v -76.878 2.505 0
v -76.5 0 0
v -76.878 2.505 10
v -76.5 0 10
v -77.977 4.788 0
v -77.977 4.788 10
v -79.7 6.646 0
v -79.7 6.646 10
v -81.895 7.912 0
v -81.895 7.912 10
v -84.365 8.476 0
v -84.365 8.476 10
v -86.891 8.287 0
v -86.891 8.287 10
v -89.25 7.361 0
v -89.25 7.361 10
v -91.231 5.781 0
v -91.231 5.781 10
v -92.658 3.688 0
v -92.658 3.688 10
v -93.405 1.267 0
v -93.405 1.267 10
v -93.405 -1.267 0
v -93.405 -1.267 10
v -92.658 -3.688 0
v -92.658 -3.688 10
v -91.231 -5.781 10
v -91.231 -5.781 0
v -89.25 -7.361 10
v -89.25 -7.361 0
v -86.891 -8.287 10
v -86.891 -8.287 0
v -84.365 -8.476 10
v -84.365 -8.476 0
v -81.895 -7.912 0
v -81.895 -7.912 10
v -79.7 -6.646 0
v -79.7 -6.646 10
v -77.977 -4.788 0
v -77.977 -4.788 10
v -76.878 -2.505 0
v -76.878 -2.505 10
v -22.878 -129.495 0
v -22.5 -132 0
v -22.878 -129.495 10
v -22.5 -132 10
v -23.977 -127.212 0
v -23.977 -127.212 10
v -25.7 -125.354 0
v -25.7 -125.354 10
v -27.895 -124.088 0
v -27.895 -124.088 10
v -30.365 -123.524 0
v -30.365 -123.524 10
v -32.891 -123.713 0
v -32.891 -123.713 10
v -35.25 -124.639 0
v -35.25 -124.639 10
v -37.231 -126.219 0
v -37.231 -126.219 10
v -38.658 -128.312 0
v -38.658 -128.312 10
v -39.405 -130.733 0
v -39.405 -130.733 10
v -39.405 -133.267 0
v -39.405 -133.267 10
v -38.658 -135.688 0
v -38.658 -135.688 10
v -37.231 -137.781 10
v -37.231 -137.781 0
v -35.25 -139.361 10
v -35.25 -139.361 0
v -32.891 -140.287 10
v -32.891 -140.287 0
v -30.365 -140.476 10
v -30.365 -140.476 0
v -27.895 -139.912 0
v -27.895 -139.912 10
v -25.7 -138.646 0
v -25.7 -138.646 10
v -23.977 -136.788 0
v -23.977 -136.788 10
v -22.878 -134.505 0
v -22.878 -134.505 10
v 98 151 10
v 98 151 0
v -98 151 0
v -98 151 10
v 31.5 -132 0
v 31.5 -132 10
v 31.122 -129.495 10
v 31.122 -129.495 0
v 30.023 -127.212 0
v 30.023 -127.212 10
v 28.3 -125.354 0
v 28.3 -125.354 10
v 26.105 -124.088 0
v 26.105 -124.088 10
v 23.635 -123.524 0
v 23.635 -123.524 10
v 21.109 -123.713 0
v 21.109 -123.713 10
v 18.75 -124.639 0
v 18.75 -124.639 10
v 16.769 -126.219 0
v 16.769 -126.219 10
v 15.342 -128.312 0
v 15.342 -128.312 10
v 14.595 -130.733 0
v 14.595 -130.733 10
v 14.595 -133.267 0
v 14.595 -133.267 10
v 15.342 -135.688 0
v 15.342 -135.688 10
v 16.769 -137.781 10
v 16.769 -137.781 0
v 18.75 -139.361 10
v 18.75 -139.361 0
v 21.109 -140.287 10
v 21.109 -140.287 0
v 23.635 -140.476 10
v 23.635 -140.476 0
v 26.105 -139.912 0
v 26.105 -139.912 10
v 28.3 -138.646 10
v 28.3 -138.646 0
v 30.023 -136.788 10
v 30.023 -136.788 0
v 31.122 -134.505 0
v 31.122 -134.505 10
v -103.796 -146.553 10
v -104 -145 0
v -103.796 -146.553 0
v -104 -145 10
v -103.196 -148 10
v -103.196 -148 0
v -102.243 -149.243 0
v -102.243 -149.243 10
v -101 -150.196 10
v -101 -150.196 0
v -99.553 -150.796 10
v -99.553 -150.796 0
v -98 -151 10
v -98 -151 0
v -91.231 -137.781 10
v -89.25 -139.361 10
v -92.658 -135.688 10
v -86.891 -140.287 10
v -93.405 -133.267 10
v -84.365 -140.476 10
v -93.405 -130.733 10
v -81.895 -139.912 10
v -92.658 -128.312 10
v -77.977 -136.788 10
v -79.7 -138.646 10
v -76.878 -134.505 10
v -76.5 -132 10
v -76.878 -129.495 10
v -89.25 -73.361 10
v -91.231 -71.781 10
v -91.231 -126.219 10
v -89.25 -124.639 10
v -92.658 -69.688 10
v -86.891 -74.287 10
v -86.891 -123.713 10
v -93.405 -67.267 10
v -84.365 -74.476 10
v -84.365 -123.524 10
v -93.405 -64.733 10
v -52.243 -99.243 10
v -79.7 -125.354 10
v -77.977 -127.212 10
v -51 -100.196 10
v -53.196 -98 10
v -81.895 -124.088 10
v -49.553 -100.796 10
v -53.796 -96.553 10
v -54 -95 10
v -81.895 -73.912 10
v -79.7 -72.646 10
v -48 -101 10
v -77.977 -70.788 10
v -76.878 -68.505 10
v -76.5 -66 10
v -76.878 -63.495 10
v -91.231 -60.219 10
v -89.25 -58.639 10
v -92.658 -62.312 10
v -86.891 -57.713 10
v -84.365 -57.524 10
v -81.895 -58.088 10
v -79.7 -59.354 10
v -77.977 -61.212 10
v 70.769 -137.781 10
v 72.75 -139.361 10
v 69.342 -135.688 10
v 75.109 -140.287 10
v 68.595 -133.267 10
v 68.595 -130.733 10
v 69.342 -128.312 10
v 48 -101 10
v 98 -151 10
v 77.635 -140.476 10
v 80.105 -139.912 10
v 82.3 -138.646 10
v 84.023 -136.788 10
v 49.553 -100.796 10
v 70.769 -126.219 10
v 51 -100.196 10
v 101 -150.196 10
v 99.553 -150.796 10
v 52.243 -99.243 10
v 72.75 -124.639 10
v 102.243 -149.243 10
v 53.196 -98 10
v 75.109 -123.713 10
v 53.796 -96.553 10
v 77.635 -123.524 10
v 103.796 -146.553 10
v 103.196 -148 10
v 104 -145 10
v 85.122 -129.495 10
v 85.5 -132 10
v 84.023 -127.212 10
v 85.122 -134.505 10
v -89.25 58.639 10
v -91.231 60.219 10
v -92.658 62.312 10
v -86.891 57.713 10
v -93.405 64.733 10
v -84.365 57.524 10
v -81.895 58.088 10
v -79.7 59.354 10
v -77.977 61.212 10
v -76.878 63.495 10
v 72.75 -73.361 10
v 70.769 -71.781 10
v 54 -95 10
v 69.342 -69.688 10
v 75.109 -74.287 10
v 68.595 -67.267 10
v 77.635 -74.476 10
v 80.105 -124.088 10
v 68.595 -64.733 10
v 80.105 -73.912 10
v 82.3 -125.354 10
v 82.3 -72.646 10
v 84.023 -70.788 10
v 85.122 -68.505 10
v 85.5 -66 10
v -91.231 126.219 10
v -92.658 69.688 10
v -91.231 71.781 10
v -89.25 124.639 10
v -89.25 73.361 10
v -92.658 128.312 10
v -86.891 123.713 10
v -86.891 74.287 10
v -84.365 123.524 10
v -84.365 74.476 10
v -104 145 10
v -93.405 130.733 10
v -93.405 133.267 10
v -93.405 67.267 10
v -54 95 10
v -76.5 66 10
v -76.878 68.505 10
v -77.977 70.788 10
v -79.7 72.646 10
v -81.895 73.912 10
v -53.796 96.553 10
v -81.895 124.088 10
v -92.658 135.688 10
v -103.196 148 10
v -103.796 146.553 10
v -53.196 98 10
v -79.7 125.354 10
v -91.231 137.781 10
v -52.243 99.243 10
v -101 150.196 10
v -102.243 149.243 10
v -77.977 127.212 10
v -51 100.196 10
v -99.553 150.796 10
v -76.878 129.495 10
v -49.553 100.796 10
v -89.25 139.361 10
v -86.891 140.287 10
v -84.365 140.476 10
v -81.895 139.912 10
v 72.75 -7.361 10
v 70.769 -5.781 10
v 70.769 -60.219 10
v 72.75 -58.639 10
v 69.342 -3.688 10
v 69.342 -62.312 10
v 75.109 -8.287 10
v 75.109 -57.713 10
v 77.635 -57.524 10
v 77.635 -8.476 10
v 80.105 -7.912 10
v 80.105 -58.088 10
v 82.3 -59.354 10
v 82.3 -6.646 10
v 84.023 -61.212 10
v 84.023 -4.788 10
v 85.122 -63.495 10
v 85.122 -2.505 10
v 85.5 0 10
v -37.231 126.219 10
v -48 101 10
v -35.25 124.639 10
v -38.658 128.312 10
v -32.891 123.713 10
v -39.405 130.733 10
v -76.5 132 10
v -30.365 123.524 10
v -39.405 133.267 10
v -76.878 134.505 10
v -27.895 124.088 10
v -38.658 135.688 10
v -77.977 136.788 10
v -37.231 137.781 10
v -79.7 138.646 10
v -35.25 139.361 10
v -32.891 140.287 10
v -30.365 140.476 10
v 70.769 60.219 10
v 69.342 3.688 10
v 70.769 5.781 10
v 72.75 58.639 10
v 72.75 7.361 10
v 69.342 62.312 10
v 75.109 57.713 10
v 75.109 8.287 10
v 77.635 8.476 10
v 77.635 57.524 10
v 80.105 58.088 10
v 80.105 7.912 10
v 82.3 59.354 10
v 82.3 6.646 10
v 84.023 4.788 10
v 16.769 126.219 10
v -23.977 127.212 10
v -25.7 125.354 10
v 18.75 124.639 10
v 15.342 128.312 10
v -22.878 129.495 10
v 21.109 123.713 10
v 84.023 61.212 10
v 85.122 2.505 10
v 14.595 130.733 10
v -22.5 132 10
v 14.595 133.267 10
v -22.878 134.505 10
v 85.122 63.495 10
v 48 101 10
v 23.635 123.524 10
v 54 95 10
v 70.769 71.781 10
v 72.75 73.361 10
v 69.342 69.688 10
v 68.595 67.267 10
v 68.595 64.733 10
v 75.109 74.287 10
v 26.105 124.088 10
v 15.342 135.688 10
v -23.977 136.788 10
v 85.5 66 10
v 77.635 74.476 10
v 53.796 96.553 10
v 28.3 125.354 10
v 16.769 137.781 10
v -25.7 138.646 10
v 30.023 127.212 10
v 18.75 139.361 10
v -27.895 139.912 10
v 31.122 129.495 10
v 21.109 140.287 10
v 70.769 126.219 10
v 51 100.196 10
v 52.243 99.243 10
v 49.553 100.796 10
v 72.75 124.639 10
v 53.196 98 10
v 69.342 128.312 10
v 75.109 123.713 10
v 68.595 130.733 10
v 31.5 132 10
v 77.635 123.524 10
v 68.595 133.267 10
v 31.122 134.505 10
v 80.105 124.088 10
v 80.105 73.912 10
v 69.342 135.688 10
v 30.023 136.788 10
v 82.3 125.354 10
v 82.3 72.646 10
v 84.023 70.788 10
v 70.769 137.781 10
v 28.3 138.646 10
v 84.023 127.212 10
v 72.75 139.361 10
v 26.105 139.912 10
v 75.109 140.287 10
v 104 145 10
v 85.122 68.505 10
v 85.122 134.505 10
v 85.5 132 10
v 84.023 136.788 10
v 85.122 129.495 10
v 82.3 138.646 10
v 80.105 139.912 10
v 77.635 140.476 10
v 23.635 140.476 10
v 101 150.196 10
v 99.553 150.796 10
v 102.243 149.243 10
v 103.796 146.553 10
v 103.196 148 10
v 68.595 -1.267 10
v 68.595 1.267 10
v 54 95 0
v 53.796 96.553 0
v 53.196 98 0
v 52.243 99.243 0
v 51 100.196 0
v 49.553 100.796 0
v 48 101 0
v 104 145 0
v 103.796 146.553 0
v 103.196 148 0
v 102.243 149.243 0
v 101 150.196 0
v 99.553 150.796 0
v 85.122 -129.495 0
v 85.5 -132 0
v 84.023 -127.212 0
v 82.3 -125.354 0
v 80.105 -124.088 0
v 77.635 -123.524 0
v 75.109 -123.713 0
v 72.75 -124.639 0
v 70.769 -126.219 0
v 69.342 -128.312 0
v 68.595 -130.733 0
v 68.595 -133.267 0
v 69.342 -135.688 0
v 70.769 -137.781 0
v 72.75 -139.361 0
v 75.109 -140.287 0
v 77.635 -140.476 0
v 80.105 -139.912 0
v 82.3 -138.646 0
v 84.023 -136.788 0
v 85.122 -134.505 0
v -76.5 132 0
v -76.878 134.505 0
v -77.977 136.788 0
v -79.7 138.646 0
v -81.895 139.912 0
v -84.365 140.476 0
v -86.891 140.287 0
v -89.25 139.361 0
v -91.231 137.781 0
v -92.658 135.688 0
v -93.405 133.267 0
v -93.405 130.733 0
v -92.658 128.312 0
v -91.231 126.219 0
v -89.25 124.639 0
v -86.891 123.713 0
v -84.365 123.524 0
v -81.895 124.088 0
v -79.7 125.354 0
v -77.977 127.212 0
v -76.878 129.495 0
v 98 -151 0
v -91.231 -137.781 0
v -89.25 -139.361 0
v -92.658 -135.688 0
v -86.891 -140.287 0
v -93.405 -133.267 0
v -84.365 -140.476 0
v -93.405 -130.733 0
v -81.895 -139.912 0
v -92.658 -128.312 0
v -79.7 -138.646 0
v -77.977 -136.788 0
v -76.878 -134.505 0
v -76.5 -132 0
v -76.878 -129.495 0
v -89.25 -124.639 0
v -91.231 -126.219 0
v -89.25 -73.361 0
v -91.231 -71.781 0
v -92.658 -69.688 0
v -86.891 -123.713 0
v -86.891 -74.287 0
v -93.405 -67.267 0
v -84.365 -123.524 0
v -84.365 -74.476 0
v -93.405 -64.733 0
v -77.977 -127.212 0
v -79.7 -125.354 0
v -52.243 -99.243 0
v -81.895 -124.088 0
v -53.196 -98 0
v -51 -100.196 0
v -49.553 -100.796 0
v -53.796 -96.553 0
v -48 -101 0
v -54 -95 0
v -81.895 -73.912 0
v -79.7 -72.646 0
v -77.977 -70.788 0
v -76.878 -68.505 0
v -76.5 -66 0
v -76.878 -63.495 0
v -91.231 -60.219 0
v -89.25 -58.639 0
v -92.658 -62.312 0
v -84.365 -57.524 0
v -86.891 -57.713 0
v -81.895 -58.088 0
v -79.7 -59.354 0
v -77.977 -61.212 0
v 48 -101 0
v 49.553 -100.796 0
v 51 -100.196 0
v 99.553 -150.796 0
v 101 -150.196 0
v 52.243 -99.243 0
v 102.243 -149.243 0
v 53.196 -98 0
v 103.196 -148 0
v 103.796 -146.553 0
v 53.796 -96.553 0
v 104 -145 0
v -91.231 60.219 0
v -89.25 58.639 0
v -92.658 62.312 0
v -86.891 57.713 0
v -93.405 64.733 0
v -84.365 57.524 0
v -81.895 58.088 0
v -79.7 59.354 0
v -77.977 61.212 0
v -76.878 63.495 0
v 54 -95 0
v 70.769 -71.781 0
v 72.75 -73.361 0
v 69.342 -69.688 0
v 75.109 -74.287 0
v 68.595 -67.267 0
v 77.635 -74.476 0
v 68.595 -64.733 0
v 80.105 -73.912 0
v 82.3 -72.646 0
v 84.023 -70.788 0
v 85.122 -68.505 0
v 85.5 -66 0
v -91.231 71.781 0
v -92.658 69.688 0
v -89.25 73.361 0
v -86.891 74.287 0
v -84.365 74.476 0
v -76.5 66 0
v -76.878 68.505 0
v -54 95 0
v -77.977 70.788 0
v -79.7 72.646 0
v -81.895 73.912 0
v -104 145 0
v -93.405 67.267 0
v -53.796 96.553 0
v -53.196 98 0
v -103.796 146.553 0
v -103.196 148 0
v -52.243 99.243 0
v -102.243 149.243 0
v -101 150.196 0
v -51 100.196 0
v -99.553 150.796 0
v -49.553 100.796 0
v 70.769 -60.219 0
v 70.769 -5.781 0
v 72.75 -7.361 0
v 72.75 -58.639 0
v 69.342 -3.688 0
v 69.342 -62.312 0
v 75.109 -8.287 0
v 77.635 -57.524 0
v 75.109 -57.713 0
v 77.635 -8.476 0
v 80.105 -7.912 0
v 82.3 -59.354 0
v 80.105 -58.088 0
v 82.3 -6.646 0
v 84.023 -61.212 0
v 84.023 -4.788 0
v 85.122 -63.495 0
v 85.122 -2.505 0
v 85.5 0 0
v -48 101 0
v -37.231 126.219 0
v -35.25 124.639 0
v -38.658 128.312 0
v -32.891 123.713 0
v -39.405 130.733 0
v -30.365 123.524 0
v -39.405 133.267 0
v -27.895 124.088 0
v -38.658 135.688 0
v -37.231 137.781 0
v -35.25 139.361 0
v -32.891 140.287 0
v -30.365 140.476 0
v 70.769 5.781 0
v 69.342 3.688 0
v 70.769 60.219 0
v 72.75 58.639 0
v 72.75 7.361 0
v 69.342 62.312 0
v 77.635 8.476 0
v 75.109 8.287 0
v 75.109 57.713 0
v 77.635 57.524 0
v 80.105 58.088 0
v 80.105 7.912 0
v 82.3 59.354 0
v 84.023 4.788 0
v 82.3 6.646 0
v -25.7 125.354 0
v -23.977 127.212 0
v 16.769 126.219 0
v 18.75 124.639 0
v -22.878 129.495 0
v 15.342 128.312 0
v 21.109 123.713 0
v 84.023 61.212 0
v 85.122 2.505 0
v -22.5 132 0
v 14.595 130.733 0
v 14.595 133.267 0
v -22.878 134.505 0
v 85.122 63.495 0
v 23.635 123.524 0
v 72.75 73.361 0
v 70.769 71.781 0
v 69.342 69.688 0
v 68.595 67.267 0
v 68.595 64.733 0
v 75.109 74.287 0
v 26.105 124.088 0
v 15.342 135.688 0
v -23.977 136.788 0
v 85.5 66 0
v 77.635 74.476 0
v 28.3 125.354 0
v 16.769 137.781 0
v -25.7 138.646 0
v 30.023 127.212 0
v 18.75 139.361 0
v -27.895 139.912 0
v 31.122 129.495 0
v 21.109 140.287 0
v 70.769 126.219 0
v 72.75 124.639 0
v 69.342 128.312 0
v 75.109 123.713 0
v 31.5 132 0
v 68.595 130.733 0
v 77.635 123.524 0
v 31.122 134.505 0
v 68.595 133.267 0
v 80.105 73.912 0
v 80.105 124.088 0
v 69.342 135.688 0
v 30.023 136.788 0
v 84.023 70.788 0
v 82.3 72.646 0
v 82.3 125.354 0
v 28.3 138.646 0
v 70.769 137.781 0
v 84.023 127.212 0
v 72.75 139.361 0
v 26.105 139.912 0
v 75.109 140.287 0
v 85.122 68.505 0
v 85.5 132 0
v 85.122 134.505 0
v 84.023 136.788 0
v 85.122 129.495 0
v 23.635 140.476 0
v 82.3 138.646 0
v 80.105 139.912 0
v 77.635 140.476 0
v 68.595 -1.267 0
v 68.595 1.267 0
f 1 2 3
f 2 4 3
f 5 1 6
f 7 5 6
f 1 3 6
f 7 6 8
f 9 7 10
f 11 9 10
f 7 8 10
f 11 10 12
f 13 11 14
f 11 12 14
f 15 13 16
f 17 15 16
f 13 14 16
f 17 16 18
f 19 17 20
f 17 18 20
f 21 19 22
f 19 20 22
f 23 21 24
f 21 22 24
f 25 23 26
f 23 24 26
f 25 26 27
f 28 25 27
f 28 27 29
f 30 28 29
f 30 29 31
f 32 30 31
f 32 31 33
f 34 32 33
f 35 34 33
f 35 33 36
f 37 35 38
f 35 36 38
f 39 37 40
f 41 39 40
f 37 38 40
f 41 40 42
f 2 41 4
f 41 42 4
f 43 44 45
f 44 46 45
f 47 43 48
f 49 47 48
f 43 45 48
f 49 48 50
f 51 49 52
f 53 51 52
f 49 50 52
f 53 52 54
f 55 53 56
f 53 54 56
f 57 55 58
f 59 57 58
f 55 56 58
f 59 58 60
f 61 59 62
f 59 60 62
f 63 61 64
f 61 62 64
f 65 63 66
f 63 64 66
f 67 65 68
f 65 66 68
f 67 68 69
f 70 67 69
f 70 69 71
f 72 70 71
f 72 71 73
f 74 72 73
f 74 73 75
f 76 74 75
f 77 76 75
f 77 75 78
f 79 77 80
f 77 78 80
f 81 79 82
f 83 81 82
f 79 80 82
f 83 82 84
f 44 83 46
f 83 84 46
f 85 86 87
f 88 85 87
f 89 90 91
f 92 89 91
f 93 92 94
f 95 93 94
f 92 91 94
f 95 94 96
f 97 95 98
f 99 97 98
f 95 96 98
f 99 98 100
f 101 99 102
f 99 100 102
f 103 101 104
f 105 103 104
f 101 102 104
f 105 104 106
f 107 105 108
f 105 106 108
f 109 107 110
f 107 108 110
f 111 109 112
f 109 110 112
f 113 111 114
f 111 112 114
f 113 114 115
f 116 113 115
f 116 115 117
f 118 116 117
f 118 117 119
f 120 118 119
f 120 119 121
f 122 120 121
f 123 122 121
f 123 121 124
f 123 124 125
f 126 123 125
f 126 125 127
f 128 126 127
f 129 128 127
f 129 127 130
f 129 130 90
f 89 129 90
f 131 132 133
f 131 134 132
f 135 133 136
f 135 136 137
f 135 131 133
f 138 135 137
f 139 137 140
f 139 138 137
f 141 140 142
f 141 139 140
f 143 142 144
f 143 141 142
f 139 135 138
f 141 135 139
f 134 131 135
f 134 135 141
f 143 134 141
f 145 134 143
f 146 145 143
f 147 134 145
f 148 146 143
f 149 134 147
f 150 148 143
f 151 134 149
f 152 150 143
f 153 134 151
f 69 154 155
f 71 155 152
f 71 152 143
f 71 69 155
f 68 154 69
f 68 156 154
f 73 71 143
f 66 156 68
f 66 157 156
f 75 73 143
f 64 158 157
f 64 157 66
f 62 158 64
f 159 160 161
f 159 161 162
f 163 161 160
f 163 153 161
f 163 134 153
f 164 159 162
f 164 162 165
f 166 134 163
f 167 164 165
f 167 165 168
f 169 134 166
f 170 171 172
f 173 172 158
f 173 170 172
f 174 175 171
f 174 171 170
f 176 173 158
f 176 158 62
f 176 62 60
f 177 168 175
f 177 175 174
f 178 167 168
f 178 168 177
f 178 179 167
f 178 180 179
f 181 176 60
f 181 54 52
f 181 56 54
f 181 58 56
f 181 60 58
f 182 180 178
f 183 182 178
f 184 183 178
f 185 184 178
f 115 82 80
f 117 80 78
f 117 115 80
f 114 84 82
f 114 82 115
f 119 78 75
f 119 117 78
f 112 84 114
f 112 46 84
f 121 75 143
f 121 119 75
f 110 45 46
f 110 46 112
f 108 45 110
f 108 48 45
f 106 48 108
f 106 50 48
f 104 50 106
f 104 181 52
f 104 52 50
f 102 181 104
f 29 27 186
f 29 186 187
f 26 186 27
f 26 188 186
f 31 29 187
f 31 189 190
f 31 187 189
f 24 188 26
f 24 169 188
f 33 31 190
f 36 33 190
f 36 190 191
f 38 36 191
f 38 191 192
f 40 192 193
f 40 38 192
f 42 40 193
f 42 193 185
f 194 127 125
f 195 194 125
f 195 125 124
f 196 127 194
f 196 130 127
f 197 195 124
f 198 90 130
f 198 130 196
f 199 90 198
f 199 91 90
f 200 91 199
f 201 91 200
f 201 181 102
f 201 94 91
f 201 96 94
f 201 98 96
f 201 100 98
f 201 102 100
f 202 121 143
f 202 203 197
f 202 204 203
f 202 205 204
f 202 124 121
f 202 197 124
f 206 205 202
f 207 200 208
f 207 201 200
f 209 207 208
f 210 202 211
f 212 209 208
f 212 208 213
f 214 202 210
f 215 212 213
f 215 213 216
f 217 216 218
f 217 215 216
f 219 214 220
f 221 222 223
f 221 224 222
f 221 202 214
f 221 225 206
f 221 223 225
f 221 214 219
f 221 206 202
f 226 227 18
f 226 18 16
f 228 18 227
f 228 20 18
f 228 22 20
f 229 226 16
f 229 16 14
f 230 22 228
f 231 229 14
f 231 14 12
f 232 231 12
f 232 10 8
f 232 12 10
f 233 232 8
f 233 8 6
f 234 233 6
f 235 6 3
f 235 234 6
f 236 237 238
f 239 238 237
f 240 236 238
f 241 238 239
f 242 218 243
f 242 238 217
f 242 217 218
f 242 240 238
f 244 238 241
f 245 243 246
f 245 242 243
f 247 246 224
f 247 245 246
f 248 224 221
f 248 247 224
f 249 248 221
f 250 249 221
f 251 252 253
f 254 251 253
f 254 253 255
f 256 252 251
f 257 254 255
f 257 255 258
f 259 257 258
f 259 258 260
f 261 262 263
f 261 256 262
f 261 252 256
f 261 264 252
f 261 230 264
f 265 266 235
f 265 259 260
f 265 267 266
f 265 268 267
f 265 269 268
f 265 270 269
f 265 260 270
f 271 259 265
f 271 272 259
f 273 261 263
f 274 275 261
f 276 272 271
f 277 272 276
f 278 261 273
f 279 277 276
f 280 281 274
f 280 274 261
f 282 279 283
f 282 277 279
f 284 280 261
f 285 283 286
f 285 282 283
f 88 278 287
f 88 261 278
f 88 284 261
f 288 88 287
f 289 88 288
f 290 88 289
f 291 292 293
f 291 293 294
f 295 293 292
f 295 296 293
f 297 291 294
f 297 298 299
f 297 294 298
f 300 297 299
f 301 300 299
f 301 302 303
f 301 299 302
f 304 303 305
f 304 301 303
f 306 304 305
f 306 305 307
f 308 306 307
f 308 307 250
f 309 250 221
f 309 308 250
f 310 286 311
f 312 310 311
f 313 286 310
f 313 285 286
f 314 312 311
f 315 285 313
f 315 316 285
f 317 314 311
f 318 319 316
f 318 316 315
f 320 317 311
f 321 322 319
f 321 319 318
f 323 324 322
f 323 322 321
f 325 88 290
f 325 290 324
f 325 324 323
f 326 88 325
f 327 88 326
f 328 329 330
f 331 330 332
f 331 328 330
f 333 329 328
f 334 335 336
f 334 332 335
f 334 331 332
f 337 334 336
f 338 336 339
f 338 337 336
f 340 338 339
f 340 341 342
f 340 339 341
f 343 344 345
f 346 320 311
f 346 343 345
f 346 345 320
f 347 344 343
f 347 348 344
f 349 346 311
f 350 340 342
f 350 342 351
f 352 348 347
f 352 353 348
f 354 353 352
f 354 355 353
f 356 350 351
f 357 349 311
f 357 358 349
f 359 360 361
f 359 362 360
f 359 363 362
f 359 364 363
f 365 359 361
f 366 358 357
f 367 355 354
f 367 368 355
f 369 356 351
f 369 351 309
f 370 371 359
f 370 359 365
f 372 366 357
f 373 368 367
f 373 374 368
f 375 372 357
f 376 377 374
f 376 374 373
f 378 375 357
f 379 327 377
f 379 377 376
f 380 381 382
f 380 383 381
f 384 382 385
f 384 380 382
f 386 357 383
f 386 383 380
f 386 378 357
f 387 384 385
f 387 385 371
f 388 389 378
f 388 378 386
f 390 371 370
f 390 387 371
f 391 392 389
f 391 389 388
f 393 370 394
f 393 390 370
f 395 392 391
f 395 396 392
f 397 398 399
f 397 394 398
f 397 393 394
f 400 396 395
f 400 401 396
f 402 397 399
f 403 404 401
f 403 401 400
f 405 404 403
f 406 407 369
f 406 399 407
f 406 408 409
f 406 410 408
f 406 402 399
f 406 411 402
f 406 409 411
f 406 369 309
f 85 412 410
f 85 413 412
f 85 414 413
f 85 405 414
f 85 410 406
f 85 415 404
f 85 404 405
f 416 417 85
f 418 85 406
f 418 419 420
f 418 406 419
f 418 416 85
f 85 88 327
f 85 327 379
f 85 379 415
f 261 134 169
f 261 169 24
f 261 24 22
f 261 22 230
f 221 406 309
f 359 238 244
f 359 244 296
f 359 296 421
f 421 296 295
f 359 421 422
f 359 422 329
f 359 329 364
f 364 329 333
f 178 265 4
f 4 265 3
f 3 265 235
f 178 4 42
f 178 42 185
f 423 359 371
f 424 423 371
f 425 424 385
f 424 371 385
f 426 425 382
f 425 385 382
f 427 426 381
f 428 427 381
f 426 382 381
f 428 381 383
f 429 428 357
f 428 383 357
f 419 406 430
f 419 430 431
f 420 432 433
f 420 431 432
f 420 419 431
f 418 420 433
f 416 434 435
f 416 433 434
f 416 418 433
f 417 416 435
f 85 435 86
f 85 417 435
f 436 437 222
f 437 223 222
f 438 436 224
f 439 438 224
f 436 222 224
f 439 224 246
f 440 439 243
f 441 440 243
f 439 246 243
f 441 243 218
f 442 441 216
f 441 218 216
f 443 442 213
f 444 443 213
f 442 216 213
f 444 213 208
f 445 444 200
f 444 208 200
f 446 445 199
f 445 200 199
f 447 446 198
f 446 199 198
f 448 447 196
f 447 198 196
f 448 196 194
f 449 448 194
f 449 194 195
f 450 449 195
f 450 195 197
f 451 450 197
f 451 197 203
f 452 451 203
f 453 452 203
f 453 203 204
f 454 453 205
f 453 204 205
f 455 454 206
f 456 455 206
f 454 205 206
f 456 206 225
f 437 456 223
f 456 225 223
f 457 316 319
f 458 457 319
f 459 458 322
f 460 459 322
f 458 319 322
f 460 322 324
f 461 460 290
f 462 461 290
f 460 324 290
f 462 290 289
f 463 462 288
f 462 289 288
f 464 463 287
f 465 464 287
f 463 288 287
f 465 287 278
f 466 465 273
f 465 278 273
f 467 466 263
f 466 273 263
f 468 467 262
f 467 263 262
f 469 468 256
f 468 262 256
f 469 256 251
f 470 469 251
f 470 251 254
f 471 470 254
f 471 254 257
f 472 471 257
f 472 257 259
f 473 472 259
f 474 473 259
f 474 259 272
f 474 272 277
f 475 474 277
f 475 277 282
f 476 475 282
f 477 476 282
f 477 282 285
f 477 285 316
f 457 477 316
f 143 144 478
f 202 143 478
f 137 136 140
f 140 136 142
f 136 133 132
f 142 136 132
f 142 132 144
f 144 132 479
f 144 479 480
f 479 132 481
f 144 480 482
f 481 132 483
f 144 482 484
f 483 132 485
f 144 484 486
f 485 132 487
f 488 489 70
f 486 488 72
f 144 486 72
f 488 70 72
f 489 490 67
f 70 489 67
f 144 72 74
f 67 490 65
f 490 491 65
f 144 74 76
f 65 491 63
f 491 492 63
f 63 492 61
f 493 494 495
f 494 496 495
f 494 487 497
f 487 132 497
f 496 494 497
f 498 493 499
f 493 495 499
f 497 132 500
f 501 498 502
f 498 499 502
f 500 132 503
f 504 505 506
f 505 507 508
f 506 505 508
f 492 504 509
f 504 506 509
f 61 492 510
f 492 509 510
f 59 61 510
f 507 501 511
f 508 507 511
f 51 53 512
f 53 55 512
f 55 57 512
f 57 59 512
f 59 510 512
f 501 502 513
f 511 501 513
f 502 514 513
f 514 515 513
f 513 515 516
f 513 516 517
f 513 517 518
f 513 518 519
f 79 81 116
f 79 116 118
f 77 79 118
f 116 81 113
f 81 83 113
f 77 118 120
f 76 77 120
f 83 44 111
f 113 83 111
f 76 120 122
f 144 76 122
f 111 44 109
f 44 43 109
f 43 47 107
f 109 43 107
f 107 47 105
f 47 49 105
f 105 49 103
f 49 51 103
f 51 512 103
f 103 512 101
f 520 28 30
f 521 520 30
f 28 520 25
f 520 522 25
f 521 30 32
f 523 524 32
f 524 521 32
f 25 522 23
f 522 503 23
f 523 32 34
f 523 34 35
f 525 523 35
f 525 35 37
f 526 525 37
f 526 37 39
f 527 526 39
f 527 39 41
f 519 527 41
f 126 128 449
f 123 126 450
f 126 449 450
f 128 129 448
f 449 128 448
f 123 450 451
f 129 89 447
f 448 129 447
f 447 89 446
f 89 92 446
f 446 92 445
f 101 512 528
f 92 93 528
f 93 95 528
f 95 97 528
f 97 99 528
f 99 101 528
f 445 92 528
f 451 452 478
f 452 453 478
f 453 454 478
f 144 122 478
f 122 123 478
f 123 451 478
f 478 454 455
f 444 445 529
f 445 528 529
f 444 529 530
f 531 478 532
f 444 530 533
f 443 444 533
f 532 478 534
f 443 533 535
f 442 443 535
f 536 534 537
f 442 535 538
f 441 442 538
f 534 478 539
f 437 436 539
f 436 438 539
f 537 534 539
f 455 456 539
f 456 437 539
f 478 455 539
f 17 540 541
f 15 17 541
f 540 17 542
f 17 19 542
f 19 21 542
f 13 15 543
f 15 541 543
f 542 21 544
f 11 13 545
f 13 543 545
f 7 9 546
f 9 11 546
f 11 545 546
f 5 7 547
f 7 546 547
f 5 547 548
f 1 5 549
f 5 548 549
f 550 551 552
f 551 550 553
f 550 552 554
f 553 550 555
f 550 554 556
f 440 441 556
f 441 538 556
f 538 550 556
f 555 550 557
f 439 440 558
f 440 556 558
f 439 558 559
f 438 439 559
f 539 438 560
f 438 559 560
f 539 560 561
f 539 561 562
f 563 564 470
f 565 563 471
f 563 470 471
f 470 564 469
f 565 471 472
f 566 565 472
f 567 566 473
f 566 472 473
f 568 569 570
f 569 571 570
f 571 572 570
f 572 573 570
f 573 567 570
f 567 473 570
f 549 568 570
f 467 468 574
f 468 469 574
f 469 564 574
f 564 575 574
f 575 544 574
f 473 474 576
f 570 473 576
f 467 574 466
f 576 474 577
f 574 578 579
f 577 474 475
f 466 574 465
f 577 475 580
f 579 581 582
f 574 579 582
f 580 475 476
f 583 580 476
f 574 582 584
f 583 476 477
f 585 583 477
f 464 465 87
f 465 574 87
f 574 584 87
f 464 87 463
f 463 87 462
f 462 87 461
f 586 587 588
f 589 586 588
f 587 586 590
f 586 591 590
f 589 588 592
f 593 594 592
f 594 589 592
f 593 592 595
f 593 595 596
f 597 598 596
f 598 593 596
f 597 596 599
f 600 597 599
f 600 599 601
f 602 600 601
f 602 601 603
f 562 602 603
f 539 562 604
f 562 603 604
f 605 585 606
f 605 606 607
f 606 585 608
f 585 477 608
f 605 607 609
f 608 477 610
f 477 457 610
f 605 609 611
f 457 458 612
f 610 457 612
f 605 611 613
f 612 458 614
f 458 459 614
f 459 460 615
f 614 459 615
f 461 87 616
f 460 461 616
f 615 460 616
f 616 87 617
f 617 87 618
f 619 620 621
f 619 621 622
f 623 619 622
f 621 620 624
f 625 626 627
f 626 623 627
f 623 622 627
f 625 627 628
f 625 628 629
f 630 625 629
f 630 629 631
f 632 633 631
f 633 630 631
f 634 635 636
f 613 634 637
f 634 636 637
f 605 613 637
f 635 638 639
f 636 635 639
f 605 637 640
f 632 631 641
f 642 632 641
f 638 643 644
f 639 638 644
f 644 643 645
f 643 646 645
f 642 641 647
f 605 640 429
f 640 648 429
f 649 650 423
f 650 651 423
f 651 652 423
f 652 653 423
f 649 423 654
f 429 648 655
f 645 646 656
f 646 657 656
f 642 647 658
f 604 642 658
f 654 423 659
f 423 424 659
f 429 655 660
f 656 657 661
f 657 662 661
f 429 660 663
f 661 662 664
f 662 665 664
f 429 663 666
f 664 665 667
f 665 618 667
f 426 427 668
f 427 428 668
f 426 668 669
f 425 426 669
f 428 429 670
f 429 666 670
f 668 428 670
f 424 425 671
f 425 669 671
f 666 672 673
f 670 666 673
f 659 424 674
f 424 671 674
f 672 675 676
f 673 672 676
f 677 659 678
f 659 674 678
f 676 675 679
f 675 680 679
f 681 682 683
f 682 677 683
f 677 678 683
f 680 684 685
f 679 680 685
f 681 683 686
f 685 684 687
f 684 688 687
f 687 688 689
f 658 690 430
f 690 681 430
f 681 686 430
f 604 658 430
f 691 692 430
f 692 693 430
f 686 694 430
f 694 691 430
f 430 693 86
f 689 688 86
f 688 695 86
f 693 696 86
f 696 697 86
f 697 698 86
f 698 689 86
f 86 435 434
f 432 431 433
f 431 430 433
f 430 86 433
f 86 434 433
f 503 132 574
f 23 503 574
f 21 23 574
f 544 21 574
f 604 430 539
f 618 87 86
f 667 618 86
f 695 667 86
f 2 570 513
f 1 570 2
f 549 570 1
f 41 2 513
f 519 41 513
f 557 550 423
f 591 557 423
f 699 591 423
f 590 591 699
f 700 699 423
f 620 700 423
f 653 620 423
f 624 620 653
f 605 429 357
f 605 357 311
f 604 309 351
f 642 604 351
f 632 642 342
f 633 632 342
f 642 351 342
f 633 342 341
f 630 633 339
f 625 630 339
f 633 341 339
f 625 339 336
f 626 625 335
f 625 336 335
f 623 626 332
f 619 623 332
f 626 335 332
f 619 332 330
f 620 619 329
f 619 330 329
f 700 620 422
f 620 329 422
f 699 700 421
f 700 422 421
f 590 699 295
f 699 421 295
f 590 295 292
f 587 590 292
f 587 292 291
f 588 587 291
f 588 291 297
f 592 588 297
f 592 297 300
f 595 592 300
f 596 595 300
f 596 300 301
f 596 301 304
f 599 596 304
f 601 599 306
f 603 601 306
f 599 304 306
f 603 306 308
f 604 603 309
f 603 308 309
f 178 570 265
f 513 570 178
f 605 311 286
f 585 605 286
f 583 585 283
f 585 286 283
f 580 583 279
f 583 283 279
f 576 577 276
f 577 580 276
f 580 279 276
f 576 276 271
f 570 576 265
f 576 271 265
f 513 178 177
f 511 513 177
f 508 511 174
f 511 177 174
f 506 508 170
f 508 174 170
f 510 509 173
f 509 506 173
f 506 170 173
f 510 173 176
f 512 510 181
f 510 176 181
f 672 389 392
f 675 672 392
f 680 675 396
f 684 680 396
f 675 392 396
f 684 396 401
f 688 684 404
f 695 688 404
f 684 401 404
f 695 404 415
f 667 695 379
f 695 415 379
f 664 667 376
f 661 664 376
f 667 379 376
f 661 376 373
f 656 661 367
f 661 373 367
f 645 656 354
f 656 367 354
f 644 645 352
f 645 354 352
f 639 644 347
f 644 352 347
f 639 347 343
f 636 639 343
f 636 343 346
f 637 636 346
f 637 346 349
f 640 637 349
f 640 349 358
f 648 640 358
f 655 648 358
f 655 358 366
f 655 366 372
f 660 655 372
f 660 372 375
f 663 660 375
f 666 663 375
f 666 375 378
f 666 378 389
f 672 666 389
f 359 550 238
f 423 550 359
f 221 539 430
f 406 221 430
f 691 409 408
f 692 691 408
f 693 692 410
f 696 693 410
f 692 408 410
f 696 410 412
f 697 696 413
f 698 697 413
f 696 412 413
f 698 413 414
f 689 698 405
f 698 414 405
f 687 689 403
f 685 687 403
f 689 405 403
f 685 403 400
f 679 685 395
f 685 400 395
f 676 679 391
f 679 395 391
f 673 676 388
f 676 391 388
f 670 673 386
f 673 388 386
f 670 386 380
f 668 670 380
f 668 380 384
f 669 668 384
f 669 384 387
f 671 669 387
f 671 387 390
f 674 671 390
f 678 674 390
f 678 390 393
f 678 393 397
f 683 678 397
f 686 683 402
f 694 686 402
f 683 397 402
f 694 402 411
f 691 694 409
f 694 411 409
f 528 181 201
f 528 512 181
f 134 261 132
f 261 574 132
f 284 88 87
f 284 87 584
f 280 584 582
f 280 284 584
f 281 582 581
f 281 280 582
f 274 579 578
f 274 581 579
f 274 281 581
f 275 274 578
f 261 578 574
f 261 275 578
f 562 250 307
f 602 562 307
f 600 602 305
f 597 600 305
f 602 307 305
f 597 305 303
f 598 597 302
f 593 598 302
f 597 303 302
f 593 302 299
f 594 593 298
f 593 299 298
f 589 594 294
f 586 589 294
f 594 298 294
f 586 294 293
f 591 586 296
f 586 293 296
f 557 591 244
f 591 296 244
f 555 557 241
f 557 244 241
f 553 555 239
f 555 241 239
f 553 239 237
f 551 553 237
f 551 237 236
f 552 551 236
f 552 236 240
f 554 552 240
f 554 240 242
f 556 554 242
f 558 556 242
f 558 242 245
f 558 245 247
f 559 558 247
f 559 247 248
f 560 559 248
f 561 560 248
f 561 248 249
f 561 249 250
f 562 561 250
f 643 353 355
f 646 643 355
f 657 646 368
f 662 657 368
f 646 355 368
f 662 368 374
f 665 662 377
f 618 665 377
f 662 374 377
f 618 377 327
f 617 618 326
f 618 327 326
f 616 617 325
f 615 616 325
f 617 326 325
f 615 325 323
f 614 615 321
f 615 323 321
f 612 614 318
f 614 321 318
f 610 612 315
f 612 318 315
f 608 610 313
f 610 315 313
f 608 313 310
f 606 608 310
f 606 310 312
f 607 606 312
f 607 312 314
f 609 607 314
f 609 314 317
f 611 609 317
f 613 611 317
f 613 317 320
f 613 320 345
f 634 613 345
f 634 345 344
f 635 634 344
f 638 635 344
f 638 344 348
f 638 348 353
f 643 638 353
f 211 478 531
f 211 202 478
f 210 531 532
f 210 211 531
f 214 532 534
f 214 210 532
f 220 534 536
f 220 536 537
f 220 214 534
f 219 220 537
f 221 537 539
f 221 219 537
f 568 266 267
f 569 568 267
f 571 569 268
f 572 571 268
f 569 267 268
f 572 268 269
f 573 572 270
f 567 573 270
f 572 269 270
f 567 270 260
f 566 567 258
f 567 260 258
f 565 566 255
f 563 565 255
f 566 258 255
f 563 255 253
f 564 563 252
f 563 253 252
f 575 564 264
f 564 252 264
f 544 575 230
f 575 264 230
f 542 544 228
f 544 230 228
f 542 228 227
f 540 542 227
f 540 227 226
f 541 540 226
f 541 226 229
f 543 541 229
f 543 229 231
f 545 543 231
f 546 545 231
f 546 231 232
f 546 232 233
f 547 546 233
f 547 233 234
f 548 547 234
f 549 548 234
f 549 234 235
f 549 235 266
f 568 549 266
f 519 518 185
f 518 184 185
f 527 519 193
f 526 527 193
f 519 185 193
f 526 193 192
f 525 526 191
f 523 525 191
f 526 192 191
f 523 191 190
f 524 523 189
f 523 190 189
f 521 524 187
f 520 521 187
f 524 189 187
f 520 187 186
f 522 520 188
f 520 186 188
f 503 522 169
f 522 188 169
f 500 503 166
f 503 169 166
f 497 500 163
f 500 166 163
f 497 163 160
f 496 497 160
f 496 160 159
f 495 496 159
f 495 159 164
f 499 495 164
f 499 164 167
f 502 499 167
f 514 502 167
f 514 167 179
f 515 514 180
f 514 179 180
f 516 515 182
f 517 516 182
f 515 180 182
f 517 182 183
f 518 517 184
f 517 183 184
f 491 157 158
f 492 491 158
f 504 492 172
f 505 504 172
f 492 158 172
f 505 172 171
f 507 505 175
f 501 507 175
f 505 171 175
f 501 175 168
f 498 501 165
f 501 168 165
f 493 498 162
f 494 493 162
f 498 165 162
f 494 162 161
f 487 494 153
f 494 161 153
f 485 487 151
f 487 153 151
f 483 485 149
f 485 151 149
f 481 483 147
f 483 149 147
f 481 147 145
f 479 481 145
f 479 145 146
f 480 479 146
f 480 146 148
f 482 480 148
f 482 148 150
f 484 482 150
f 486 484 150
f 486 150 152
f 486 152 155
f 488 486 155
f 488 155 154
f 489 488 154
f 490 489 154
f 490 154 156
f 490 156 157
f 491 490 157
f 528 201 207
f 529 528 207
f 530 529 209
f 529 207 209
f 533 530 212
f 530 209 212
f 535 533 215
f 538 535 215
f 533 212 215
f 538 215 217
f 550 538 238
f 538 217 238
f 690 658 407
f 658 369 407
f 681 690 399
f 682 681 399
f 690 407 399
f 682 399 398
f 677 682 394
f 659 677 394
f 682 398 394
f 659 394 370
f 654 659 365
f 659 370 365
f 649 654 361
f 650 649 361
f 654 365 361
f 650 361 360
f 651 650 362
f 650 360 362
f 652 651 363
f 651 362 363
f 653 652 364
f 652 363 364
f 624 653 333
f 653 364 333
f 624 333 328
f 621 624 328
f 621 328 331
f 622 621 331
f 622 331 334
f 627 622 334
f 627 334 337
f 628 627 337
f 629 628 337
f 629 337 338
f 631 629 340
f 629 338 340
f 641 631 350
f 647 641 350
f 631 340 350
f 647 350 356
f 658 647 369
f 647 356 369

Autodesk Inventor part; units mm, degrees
ref_plane "YZ Plane" through (0, 0, 0) normal (1, 0, 0) x (0, 1, 0)
ref_plane "XZ Plane" through (0, 0, 0) normal (0, 1, 0) x (-1, 0, 0)
ref_plane "XY Plane" through (0, 0, 0) normal (0, 0, 1) x (1, 0, 0)
sketch "Sketch2" plane through (0, 0, 0) normal (0, 0, 1) x (1, 0, 0)
  line L0 (-54, -101) -> (54, -101)
  line L1 (54, -101) -> (54, 101)
  line L2 (54, 101) -> (-54, 101)
  line L3 (-54, 101) -> (-54, -101)
  line L4 (-54, -101) -> (54, 101) construction
  line L5 (54, -101) -> (-54, 101) construction
  line L6 (-104, -151) -> (104, -151)
  line L7 (104, -151) -> (104, 151)
  line L8 (104, 151) -> (-104, 151)
  line L9 (-104, 151) -> (-104, -151)
  point P0 (0, 0)
  dimension "d29" = 108
  dimension "d30" = 202
  dimension "d31" = 50
  dimension "d47" = 208
  dimension "d48" = 302
extrude "Plate2" add sketch "Sketch2" along normal blind 10
sketch "Sketch5" plane through (0, 0, 10) normal (0, 0, 1) x (1, 0, 0)
  line L0 (54, 101) -> (54, -101) construction
  line L1 (54, -101) -> (-54, -101) construction
  line L2 (-54, -101) -> (-54, 101) construction
  line L3 (-54, 101) -> (54, 101) construction
  line L4 (104, -151) -> (-104, -151) construction
  line L5 (104, 151) -> (104, -151) construction
  line L6 (-104, 151) -> (104, 151) construction
  line L7 (-104, -151) -> (-104, 151) construction
  line L8 (-85, 132) -> (85, 132) construction
  line L9 (85, 132) -> (85, -132) construction
  line L10 (85, -132) -> (-85, -132) construction
  line L11 (-85, -132) -> (-85, 132) construction
  circle A0 centre (-85, -132) radius 8.5
  circle A1 centre (-85, 132) radius 8.5
  circle A2 centre (-85, 0) radius 8.5
  circle A3 centre (-85, -66) radius 8.5
  circle A4 centre (-85, 66) radius 8.5
  line L12 (-54, 0) -> (54, 0) construction
  circle A5 centre (-31, -132) radius 8.5
  circle A6 centre (-31, -66) radius 8.5
  circle A7 centre (-31, 0) radius 8.5
  circle A8 centre (-31, 66) radius 8.5
  circle A9 centre (-31, 132) radius 8.5
  circle A10 centre (23, -132) radius 8.5
  circle A11 centre (23, -66) radius 8.5
  circle A12 centre (23, 0) radius 8.5
  circle A13 centre (23, 66) radius 8.5
  circle A14 centre (23, 132) radius 8.5
  circle A15 centre (77, -132) radius 8.5
  circle A16 centre (77, -66) radius 8.5
  circle A17 centre (77, 0) radius 8.5
  circle A18 centre (77, 66) radius 8.5
  circle A19 centre (77, 132) radius 8.5
  point P0 (0, 0)
  point P1 (0, -132)
  dimension "d33" = 17
  dimension "d34" = 19
  dimension "d35" = 66
  dimension "d36" = 66
  dimension "d39" = 54
extrude "Cut3" cut sketch "Sketch5" against normal blind 10
fillet "Corner Round1" radius 6 8 edges at (-104, -151, 5) (-104, 151, 5) (104, 151, 5) (104, -151, 5) (54, -101, 5) (-54, -101, 5) (-54, 101, 5) (54, 101, 5)
equation "\"d35\" = d36"
equation "\"d44\" = Thickness"
equation "\"d14\" = Thickness"
equation "\"BendReliefDepth\" = 0.5 * Thickness"
equation "\"TransitionRadius\" = BendRadius"
equation "\"JacobiRadiusSize\" = BendRadius"
equation "\"Thickness\" = 10"
equation "\"BendRadius\" = 6"
properties part number "PRS 1200-06 charging flange round" material "Steel"
